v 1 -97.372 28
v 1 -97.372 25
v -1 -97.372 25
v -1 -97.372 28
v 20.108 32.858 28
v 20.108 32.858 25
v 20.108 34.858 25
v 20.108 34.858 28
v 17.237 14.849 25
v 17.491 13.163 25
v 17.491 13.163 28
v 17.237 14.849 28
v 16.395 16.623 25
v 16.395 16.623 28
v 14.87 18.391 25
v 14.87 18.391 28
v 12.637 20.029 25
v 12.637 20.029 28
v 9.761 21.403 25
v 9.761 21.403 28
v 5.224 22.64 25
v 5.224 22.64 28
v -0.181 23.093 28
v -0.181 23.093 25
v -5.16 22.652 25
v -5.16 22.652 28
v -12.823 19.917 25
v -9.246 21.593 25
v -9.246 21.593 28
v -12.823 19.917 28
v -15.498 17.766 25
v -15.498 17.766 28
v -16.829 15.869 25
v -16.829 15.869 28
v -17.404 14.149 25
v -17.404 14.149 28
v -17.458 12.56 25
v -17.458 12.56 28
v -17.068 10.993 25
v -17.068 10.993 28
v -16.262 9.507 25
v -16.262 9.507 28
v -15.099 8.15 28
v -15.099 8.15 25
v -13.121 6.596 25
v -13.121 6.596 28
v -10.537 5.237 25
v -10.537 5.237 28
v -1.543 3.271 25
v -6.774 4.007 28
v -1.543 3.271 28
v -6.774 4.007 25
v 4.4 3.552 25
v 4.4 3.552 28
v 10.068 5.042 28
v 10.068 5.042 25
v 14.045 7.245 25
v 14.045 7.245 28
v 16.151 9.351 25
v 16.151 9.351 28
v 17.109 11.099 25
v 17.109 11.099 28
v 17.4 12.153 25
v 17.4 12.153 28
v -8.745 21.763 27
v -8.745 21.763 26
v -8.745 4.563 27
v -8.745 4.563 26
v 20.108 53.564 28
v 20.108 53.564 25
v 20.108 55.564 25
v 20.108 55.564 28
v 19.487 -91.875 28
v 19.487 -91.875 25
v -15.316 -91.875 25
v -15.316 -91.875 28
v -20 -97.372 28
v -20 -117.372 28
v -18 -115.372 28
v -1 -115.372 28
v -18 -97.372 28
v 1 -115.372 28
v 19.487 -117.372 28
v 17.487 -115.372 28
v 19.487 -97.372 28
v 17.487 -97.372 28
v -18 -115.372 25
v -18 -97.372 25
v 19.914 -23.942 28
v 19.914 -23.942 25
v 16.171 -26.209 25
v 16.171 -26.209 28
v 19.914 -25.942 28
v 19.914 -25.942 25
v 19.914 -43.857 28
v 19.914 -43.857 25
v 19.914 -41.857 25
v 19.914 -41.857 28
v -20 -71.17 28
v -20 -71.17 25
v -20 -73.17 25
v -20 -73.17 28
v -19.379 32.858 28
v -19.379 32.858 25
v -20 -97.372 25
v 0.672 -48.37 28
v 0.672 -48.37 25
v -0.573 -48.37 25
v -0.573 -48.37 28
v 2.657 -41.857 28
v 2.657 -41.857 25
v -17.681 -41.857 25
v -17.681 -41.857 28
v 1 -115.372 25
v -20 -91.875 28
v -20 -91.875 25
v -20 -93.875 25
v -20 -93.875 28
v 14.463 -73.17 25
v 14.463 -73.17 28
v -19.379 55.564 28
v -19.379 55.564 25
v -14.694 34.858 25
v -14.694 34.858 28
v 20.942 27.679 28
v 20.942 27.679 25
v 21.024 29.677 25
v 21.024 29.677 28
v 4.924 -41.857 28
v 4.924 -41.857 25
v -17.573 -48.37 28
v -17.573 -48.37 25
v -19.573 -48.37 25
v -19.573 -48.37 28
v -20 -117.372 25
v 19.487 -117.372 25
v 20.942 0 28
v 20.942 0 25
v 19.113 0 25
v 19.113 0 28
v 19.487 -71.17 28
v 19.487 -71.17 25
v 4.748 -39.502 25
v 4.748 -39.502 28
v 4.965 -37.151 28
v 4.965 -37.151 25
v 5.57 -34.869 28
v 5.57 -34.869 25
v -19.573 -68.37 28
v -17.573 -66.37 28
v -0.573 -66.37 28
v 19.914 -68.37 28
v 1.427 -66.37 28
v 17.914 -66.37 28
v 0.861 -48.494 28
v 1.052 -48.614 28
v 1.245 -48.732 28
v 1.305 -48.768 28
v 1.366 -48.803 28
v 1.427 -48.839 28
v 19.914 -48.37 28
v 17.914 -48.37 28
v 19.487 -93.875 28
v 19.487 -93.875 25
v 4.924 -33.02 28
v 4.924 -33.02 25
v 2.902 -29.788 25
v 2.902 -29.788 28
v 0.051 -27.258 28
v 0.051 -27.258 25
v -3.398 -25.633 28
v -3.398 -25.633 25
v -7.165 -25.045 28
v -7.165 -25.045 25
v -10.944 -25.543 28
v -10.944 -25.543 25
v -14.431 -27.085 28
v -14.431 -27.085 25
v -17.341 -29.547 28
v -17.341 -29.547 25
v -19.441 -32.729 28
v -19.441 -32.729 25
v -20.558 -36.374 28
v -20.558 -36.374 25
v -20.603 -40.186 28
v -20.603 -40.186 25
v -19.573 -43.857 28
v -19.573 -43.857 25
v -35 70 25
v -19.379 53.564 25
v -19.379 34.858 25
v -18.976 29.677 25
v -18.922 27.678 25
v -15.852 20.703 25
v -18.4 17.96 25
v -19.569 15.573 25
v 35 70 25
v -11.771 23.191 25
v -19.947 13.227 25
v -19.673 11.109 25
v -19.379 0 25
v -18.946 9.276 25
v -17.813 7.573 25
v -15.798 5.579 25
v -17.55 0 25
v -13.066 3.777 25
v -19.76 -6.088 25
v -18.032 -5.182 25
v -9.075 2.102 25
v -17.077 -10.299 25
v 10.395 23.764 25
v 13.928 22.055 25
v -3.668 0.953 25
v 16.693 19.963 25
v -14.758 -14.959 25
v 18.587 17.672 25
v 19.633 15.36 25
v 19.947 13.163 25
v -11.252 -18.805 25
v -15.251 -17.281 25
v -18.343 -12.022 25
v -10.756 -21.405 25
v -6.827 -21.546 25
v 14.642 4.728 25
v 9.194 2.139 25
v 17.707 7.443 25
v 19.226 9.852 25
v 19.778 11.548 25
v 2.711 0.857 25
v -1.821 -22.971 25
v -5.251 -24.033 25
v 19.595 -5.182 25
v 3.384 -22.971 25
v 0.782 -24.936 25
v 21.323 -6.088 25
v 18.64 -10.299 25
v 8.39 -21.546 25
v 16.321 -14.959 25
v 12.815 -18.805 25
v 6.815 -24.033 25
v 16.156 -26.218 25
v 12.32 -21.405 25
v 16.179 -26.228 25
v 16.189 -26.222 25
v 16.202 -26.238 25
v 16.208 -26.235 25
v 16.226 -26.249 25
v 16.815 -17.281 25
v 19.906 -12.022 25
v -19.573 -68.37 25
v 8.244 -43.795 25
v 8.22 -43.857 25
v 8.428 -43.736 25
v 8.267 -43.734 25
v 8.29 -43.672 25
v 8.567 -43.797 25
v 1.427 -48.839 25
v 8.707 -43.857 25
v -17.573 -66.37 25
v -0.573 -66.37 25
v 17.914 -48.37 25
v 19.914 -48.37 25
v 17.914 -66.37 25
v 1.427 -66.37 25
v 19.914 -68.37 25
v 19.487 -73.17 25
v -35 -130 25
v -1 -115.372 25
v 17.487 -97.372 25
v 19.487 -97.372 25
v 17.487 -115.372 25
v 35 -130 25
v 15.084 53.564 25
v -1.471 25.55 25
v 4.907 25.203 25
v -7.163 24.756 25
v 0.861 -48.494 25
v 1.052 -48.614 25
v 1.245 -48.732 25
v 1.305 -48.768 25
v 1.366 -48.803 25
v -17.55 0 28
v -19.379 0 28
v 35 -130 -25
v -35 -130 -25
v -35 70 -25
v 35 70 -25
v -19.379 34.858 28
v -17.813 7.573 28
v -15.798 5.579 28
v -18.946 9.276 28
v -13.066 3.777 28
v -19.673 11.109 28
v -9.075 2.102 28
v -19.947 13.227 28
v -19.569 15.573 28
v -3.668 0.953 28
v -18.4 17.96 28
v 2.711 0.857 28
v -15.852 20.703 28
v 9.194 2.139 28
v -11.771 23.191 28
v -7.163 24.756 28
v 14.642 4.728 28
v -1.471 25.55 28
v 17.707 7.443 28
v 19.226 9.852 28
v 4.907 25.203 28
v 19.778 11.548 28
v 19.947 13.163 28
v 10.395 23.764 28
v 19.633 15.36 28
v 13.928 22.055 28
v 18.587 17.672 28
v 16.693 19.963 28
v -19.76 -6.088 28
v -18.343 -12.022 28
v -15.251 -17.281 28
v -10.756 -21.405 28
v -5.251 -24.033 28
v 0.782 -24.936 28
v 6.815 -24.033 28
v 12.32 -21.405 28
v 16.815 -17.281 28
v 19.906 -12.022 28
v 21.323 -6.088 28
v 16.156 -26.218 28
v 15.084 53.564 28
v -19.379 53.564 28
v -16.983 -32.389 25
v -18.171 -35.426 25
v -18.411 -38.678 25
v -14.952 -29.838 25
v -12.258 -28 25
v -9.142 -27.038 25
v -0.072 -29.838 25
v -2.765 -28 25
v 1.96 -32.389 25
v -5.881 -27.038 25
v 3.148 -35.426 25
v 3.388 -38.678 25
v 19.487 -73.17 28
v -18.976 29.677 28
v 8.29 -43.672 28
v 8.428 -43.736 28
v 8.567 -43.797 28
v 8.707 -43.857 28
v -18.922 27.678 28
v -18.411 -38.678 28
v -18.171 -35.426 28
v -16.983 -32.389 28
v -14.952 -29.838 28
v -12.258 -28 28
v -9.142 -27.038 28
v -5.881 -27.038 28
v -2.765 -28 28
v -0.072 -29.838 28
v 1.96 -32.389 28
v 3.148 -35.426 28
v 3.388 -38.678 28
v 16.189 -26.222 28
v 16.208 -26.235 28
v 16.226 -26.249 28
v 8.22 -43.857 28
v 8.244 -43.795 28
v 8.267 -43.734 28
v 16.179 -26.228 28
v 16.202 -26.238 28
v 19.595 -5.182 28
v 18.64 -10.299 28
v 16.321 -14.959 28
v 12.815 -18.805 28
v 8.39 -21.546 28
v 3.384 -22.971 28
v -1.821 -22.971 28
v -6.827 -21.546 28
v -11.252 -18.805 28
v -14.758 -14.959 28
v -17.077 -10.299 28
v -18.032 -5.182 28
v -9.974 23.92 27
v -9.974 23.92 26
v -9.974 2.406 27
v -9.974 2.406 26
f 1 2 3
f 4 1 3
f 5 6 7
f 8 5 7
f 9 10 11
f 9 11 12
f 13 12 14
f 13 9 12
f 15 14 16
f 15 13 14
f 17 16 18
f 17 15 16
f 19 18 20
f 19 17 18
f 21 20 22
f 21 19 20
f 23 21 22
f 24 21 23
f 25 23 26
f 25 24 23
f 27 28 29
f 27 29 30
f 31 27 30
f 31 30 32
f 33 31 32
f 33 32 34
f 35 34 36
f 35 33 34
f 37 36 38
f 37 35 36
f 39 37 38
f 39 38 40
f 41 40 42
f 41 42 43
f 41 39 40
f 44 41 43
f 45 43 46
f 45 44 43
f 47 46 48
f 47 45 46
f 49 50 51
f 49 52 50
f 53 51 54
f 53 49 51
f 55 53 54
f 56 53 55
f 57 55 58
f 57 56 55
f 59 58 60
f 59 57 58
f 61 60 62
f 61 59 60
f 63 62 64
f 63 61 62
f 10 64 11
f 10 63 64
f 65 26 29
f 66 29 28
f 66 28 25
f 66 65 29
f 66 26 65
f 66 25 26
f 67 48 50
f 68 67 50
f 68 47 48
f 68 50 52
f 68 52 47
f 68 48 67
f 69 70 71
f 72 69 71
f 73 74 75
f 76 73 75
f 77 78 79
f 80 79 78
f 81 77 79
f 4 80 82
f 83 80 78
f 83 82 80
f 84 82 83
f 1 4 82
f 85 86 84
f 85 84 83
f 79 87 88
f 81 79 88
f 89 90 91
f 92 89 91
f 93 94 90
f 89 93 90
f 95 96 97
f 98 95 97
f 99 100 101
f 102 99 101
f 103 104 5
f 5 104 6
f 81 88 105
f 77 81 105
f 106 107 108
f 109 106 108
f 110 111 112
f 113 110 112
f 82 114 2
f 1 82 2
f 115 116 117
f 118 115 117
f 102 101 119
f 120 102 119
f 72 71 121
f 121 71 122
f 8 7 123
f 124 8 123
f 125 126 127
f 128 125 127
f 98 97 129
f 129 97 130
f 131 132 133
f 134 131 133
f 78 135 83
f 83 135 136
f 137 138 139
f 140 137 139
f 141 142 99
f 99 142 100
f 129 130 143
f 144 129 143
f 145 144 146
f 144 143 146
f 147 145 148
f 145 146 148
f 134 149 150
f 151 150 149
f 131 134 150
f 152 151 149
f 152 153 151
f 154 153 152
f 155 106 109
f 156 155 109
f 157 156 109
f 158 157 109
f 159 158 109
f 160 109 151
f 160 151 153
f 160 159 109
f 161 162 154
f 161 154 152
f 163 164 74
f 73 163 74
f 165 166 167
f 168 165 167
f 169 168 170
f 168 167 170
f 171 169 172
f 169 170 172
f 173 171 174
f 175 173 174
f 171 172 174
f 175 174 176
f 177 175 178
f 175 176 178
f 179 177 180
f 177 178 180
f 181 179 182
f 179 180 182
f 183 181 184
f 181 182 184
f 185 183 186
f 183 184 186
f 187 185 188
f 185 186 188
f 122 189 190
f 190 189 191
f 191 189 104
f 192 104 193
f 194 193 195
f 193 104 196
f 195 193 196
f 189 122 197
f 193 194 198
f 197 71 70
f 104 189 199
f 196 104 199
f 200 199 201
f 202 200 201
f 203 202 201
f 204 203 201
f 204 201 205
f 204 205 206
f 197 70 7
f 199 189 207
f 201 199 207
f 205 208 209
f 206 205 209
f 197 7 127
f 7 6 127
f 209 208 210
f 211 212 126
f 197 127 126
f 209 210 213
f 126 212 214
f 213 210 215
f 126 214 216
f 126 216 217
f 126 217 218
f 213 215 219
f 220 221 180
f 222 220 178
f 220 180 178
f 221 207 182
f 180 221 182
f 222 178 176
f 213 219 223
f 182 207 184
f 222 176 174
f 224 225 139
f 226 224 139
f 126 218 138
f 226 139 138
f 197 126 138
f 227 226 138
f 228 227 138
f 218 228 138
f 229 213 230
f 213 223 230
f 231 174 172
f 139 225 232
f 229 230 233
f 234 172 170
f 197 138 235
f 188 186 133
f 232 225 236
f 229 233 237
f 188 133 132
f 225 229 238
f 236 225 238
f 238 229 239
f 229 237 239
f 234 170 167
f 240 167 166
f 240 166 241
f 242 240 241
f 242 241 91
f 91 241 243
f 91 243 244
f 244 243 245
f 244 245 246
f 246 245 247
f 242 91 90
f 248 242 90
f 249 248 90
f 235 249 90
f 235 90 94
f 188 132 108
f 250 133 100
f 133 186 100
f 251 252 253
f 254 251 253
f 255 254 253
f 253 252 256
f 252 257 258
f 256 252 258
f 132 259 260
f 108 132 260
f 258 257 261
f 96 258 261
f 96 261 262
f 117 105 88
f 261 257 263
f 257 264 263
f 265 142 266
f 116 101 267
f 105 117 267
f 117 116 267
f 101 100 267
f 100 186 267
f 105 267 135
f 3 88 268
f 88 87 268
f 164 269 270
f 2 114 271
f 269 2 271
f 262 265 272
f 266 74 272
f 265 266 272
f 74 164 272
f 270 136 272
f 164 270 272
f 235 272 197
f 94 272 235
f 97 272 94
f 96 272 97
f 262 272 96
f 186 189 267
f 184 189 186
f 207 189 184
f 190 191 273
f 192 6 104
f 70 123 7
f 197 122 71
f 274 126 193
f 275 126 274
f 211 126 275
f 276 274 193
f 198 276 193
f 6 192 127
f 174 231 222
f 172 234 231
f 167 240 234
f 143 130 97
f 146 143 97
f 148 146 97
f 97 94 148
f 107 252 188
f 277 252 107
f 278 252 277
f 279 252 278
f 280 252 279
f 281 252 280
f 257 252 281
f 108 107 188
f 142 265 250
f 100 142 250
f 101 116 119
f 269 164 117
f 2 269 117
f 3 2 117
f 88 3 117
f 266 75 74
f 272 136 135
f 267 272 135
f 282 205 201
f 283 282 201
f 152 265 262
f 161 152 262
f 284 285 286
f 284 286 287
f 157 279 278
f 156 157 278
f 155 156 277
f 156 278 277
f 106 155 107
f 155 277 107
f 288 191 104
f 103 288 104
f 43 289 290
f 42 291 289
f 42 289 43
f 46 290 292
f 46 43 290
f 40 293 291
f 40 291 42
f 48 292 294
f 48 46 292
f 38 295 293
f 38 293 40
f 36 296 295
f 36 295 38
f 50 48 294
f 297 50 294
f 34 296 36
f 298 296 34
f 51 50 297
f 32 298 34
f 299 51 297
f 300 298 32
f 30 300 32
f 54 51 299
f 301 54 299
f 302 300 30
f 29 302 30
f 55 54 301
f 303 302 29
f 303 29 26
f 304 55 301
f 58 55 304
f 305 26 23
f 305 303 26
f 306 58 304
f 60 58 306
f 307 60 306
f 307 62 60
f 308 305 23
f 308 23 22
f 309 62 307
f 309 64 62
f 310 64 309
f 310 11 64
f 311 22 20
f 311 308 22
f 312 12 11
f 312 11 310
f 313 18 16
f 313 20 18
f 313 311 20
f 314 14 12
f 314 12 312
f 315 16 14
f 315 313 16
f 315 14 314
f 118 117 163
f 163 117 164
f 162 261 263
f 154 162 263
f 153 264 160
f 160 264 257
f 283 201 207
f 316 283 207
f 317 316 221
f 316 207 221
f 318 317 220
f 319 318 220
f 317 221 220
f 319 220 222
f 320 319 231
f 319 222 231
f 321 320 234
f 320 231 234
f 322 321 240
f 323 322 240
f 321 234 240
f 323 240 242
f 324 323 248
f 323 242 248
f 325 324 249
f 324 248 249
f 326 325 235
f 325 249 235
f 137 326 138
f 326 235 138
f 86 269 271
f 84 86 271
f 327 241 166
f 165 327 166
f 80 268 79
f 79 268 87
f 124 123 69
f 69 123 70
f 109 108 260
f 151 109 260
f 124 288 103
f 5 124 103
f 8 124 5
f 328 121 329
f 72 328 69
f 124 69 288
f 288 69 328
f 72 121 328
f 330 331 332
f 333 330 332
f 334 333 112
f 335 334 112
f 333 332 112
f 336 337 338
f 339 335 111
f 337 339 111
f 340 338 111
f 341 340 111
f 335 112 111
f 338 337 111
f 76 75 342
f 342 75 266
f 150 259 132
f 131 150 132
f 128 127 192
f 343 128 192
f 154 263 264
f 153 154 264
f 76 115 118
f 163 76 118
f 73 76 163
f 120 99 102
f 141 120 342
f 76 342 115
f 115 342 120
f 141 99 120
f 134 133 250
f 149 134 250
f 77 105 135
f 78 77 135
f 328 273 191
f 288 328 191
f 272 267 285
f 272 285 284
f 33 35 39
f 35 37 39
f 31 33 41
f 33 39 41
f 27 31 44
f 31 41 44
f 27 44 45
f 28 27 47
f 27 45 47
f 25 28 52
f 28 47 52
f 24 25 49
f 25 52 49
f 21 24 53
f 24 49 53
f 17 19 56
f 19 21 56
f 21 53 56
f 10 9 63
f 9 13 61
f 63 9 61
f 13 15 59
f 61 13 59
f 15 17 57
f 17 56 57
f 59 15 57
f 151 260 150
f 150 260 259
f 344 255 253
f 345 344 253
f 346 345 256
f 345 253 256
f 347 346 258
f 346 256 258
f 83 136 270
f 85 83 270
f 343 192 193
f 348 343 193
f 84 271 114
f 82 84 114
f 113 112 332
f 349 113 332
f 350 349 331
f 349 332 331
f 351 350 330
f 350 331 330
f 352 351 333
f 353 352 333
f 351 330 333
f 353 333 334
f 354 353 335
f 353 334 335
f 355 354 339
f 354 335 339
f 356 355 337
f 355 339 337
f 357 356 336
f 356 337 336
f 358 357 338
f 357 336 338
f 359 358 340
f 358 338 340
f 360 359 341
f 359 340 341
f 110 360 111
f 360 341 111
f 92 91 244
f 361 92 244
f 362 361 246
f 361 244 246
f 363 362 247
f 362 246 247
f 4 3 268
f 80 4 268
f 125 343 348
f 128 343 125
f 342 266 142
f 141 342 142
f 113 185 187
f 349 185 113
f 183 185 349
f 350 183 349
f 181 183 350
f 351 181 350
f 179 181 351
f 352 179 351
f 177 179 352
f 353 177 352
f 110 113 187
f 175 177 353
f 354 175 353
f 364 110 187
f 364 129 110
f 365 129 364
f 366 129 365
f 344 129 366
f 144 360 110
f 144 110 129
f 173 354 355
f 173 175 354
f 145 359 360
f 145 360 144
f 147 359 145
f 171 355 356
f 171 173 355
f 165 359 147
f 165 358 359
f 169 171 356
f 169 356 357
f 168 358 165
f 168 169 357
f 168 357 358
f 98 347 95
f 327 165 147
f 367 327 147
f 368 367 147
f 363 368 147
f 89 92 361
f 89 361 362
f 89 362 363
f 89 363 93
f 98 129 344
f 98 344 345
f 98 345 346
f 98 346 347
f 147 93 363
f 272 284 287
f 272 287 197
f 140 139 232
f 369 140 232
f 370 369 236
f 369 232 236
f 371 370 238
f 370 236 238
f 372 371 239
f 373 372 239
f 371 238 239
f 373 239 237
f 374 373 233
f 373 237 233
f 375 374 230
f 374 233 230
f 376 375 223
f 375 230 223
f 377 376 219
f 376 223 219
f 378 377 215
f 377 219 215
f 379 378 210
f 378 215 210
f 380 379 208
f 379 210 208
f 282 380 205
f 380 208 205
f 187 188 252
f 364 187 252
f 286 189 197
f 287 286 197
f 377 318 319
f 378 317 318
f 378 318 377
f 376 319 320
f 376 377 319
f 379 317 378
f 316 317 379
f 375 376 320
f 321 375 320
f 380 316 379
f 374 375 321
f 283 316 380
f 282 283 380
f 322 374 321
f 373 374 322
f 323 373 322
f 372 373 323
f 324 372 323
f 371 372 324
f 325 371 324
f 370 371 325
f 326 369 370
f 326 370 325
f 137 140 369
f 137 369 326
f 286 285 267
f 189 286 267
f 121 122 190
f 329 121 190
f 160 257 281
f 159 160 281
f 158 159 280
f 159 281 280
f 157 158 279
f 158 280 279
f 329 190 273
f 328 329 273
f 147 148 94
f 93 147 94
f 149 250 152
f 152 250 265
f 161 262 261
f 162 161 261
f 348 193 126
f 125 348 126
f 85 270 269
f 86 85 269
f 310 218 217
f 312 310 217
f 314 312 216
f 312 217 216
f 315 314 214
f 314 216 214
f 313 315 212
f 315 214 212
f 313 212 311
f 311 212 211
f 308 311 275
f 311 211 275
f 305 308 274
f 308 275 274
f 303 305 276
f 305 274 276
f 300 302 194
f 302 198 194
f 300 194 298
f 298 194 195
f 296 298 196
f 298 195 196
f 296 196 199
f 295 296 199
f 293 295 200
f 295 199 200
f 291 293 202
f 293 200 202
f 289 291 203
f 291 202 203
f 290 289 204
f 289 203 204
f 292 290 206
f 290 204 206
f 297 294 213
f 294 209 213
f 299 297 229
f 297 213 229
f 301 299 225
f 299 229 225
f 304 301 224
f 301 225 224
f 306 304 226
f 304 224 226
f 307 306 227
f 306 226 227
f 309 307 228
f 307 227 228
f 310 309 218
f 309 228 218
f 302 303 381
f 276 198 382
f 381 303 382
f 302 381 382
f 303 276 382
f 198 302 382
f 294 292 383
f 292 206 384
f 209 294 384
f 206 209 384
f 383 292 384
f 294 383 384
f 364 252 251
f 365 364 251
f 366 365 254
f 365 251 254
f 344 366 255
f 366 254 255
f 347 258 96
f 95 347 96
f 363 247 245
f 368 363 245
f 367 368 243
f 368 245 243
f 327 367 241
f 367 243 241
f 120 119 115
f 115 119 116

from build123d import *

# Parameters (mm, degrees)
F0_W          = 70
F0_H          = 50
F1_DEPTH      = 130
F1_DEPTH_BACK = 70
F3_DEPTH      = 3


with BuildPart() as f1:
    # F0 (on Front) → F1 (new body, two sides)
    with BuildSketch(Plane.XZ) as f1_sk:
        Rectangle(F0_W, F0_H)
    extrude(amount=F1_DEPTH)
    extrude(f1_sk.sketch, amount=-F1_DEPTH_BACK)

    # F2 (on face) → F3 (join)
    with BuildSketch(Plane.XY.offset(25)):
        Polygon((-20, -117.372043), (0, -117.372043), (19.486902, -117.372043), (19.486902, -97.372043), (17.486902, -97.372043), (17.486902, -115.372043), (1, -115.372043), (1, -97.372043), (-1, -97.372043), (-1, -115.372043), (-18, -115.372043), (-18, -97.372043), (-20, -97.372043), align=None)
        with BuildLine():
            Line((8.707276, -43.856528), (19.913864, -43.856528))
            Line((19.913864, -43.856528), (19.913864, -41.856528))
            Line((19.913864, -41.856528), (4.924431, -41.856528))
            ThreePointArc((4.924431, -41.856528), (4.807975, -38.322004), (5.569528, -34.868535))
            Line((5.569528, -34.868535), (19.913864, -25.94221))
            Line((19.913864, -25.94221), (19.913864, -23.94221))
            Line((19.913864, -23.94221), (16.171332, -26.208643))
            ThreePointArc((16.171332, -26.208643), (16.198489, -26.228568), (16.225597, -26.24856))
            ThreePointArc((16.225597, -26.24856), (16.190659, -26.233277), (16.155661, -26.218133))
            Line((16.155661, -26.218133), (4.924431, -33.019635))
            ThreePointArc((4.924431, -33.019635), (-12.74275, -26.189347), (-19.573038, -43.856528))
            Line((-19.573038, -43.856528), (8.220368, -43.856528))
            ThreePointArc((8.220368, -43.856528), (8.255555, -43.764356), (8.290131, -43.671953))
            ThreePointArc((8.290131, -43.671953), (8.497604, -43.766725), (8.707276, -43.856528))
        make_face()
        with BuildLine():
            ThreePointArc((-17.680509, -41.856528), (-7.511621, -26.91543), (2.657267, -41.856528))
            Line((2.657267, -41.856528), (-17.680509, -41.856528))
        make_face(mode=Mode.SUBTRACT)
        with BuildLine():
            Line((-17.549662, 0), (-19.378563, 0))
            ThreePointArc((-19.378563, 0), (0.781648, -24.935632), (20.941859, 0))
            Line((20.941859, 0), (19.112958, 0))
            ThreePointArc((19.112958, 0), (0.781648, -23.151189), (-17.549662, 0))
        make_face()
        with BuildLine():
            Line((-19.573038, -68.369687), (0.426962, -68.369687))
            Line((0.426962, -68.369687), (19.913864, -68.369687))
            Line((19.913864, -68.369687), (19.913864, -48.369687))
            Line((19.913864, -48.369687), (17.913864, -48.369687))
            Line((17.913864, -48.369687), (17.913864, -66.369687))
            Line((17.913864, -66.369687), (1.426962, -66.369687))
            Line((1.426962, -66.369687), (1.426962, -48.838545))
            ThreePointArc((1.426962, -48.838545), (1.335768, -48.785469), (1.244992, -48.731682))
            ThreePointArc((1.244992, -48.731682), (0.956479, -48.554269), (0.672499, -48.369687))
            Line((0.672499, -48.369687), (-0.573038, -48.369687))
            Line((-0.573038, -48.369687), (-0.573038, -66.369687))
            Line((-0.573038, -66.369687), (-17.573038, -66.369687))
            Line((-17.573038, -66.369687), (-17.573038, -48.369687))
            Line((-17.573038, -48.369687), (-19.573038, -48.369687))
            Line((-19.573038, -48.369687), (-19.573038, -68.369687))
        make_face()
        Polygon((-20, -91.874998), (-20, -93.874998), (19.486902, -93.874998), (19.486902, -91.874998), (-15.315908, -91.874998), (19.486902, -73.169678), (19.486902, -71.169678), (-20, -71.169678), (-20, -73.169678), (14.462528, -73.169678), align=None)
        with BuildLine():
            add(Edge.make_bspline(
                [(19.94747, 13.162938), (19.94747, 34.677407), (-9.973735, 23.920172), (-39.89494, 13.162938), (-9.973735, 2.405704), (19.94747, -8.351531), (19.94747, 13.162938)],
                knots=[0, 0, 0, 2.094395, 2.094395, 4.18879, 4.18879, 6.283185, 6.283185, 6.283185], degree=2, weights=[1, 0.5, 1, 0.5, 1, 0.5, 1]))
        make_face()
        with BuildLine():
            add(Edge.make_bspline(
                [(17.490629, 13.162938), (17.490629, 30.363455), (-8.745315, 21.763196), (-34.981258, 13.162938), (-8.745315, 4.562679), (17.490629, -4.037579), (17.490629, 13.162938)],
                knots=[0, 0, 0, 2.094395, 2.094395, 4.18879, 4.18879, 6.283185, 6.283185, 6.283185], degree=2, weights=[1, 0.5, 1, 0.5, 1, 0.5, 1]))
        make_face(mode=Mode.SUBTRACT)
        Polygon((-18.922255, 27.677938), (20.941859, 27.678886), (21.023758, 29.677209), (-18.976242, 29.677209), align=None)
        Polygon((-19.378563, 34.858465), (-19.378563, 32.858465), (20.108339, 32.858465), (20.108339, 34.858465), (-14.694471, 34.858465), (20.108339, 53.563785), (20.108339, 55.563785), (-19.378563, 55.563785), (-19.378563, 53.563785), (15.083965, 53.563785), align=None)
    extrude(amount=F3_DEPTH)


solid = f1.part
